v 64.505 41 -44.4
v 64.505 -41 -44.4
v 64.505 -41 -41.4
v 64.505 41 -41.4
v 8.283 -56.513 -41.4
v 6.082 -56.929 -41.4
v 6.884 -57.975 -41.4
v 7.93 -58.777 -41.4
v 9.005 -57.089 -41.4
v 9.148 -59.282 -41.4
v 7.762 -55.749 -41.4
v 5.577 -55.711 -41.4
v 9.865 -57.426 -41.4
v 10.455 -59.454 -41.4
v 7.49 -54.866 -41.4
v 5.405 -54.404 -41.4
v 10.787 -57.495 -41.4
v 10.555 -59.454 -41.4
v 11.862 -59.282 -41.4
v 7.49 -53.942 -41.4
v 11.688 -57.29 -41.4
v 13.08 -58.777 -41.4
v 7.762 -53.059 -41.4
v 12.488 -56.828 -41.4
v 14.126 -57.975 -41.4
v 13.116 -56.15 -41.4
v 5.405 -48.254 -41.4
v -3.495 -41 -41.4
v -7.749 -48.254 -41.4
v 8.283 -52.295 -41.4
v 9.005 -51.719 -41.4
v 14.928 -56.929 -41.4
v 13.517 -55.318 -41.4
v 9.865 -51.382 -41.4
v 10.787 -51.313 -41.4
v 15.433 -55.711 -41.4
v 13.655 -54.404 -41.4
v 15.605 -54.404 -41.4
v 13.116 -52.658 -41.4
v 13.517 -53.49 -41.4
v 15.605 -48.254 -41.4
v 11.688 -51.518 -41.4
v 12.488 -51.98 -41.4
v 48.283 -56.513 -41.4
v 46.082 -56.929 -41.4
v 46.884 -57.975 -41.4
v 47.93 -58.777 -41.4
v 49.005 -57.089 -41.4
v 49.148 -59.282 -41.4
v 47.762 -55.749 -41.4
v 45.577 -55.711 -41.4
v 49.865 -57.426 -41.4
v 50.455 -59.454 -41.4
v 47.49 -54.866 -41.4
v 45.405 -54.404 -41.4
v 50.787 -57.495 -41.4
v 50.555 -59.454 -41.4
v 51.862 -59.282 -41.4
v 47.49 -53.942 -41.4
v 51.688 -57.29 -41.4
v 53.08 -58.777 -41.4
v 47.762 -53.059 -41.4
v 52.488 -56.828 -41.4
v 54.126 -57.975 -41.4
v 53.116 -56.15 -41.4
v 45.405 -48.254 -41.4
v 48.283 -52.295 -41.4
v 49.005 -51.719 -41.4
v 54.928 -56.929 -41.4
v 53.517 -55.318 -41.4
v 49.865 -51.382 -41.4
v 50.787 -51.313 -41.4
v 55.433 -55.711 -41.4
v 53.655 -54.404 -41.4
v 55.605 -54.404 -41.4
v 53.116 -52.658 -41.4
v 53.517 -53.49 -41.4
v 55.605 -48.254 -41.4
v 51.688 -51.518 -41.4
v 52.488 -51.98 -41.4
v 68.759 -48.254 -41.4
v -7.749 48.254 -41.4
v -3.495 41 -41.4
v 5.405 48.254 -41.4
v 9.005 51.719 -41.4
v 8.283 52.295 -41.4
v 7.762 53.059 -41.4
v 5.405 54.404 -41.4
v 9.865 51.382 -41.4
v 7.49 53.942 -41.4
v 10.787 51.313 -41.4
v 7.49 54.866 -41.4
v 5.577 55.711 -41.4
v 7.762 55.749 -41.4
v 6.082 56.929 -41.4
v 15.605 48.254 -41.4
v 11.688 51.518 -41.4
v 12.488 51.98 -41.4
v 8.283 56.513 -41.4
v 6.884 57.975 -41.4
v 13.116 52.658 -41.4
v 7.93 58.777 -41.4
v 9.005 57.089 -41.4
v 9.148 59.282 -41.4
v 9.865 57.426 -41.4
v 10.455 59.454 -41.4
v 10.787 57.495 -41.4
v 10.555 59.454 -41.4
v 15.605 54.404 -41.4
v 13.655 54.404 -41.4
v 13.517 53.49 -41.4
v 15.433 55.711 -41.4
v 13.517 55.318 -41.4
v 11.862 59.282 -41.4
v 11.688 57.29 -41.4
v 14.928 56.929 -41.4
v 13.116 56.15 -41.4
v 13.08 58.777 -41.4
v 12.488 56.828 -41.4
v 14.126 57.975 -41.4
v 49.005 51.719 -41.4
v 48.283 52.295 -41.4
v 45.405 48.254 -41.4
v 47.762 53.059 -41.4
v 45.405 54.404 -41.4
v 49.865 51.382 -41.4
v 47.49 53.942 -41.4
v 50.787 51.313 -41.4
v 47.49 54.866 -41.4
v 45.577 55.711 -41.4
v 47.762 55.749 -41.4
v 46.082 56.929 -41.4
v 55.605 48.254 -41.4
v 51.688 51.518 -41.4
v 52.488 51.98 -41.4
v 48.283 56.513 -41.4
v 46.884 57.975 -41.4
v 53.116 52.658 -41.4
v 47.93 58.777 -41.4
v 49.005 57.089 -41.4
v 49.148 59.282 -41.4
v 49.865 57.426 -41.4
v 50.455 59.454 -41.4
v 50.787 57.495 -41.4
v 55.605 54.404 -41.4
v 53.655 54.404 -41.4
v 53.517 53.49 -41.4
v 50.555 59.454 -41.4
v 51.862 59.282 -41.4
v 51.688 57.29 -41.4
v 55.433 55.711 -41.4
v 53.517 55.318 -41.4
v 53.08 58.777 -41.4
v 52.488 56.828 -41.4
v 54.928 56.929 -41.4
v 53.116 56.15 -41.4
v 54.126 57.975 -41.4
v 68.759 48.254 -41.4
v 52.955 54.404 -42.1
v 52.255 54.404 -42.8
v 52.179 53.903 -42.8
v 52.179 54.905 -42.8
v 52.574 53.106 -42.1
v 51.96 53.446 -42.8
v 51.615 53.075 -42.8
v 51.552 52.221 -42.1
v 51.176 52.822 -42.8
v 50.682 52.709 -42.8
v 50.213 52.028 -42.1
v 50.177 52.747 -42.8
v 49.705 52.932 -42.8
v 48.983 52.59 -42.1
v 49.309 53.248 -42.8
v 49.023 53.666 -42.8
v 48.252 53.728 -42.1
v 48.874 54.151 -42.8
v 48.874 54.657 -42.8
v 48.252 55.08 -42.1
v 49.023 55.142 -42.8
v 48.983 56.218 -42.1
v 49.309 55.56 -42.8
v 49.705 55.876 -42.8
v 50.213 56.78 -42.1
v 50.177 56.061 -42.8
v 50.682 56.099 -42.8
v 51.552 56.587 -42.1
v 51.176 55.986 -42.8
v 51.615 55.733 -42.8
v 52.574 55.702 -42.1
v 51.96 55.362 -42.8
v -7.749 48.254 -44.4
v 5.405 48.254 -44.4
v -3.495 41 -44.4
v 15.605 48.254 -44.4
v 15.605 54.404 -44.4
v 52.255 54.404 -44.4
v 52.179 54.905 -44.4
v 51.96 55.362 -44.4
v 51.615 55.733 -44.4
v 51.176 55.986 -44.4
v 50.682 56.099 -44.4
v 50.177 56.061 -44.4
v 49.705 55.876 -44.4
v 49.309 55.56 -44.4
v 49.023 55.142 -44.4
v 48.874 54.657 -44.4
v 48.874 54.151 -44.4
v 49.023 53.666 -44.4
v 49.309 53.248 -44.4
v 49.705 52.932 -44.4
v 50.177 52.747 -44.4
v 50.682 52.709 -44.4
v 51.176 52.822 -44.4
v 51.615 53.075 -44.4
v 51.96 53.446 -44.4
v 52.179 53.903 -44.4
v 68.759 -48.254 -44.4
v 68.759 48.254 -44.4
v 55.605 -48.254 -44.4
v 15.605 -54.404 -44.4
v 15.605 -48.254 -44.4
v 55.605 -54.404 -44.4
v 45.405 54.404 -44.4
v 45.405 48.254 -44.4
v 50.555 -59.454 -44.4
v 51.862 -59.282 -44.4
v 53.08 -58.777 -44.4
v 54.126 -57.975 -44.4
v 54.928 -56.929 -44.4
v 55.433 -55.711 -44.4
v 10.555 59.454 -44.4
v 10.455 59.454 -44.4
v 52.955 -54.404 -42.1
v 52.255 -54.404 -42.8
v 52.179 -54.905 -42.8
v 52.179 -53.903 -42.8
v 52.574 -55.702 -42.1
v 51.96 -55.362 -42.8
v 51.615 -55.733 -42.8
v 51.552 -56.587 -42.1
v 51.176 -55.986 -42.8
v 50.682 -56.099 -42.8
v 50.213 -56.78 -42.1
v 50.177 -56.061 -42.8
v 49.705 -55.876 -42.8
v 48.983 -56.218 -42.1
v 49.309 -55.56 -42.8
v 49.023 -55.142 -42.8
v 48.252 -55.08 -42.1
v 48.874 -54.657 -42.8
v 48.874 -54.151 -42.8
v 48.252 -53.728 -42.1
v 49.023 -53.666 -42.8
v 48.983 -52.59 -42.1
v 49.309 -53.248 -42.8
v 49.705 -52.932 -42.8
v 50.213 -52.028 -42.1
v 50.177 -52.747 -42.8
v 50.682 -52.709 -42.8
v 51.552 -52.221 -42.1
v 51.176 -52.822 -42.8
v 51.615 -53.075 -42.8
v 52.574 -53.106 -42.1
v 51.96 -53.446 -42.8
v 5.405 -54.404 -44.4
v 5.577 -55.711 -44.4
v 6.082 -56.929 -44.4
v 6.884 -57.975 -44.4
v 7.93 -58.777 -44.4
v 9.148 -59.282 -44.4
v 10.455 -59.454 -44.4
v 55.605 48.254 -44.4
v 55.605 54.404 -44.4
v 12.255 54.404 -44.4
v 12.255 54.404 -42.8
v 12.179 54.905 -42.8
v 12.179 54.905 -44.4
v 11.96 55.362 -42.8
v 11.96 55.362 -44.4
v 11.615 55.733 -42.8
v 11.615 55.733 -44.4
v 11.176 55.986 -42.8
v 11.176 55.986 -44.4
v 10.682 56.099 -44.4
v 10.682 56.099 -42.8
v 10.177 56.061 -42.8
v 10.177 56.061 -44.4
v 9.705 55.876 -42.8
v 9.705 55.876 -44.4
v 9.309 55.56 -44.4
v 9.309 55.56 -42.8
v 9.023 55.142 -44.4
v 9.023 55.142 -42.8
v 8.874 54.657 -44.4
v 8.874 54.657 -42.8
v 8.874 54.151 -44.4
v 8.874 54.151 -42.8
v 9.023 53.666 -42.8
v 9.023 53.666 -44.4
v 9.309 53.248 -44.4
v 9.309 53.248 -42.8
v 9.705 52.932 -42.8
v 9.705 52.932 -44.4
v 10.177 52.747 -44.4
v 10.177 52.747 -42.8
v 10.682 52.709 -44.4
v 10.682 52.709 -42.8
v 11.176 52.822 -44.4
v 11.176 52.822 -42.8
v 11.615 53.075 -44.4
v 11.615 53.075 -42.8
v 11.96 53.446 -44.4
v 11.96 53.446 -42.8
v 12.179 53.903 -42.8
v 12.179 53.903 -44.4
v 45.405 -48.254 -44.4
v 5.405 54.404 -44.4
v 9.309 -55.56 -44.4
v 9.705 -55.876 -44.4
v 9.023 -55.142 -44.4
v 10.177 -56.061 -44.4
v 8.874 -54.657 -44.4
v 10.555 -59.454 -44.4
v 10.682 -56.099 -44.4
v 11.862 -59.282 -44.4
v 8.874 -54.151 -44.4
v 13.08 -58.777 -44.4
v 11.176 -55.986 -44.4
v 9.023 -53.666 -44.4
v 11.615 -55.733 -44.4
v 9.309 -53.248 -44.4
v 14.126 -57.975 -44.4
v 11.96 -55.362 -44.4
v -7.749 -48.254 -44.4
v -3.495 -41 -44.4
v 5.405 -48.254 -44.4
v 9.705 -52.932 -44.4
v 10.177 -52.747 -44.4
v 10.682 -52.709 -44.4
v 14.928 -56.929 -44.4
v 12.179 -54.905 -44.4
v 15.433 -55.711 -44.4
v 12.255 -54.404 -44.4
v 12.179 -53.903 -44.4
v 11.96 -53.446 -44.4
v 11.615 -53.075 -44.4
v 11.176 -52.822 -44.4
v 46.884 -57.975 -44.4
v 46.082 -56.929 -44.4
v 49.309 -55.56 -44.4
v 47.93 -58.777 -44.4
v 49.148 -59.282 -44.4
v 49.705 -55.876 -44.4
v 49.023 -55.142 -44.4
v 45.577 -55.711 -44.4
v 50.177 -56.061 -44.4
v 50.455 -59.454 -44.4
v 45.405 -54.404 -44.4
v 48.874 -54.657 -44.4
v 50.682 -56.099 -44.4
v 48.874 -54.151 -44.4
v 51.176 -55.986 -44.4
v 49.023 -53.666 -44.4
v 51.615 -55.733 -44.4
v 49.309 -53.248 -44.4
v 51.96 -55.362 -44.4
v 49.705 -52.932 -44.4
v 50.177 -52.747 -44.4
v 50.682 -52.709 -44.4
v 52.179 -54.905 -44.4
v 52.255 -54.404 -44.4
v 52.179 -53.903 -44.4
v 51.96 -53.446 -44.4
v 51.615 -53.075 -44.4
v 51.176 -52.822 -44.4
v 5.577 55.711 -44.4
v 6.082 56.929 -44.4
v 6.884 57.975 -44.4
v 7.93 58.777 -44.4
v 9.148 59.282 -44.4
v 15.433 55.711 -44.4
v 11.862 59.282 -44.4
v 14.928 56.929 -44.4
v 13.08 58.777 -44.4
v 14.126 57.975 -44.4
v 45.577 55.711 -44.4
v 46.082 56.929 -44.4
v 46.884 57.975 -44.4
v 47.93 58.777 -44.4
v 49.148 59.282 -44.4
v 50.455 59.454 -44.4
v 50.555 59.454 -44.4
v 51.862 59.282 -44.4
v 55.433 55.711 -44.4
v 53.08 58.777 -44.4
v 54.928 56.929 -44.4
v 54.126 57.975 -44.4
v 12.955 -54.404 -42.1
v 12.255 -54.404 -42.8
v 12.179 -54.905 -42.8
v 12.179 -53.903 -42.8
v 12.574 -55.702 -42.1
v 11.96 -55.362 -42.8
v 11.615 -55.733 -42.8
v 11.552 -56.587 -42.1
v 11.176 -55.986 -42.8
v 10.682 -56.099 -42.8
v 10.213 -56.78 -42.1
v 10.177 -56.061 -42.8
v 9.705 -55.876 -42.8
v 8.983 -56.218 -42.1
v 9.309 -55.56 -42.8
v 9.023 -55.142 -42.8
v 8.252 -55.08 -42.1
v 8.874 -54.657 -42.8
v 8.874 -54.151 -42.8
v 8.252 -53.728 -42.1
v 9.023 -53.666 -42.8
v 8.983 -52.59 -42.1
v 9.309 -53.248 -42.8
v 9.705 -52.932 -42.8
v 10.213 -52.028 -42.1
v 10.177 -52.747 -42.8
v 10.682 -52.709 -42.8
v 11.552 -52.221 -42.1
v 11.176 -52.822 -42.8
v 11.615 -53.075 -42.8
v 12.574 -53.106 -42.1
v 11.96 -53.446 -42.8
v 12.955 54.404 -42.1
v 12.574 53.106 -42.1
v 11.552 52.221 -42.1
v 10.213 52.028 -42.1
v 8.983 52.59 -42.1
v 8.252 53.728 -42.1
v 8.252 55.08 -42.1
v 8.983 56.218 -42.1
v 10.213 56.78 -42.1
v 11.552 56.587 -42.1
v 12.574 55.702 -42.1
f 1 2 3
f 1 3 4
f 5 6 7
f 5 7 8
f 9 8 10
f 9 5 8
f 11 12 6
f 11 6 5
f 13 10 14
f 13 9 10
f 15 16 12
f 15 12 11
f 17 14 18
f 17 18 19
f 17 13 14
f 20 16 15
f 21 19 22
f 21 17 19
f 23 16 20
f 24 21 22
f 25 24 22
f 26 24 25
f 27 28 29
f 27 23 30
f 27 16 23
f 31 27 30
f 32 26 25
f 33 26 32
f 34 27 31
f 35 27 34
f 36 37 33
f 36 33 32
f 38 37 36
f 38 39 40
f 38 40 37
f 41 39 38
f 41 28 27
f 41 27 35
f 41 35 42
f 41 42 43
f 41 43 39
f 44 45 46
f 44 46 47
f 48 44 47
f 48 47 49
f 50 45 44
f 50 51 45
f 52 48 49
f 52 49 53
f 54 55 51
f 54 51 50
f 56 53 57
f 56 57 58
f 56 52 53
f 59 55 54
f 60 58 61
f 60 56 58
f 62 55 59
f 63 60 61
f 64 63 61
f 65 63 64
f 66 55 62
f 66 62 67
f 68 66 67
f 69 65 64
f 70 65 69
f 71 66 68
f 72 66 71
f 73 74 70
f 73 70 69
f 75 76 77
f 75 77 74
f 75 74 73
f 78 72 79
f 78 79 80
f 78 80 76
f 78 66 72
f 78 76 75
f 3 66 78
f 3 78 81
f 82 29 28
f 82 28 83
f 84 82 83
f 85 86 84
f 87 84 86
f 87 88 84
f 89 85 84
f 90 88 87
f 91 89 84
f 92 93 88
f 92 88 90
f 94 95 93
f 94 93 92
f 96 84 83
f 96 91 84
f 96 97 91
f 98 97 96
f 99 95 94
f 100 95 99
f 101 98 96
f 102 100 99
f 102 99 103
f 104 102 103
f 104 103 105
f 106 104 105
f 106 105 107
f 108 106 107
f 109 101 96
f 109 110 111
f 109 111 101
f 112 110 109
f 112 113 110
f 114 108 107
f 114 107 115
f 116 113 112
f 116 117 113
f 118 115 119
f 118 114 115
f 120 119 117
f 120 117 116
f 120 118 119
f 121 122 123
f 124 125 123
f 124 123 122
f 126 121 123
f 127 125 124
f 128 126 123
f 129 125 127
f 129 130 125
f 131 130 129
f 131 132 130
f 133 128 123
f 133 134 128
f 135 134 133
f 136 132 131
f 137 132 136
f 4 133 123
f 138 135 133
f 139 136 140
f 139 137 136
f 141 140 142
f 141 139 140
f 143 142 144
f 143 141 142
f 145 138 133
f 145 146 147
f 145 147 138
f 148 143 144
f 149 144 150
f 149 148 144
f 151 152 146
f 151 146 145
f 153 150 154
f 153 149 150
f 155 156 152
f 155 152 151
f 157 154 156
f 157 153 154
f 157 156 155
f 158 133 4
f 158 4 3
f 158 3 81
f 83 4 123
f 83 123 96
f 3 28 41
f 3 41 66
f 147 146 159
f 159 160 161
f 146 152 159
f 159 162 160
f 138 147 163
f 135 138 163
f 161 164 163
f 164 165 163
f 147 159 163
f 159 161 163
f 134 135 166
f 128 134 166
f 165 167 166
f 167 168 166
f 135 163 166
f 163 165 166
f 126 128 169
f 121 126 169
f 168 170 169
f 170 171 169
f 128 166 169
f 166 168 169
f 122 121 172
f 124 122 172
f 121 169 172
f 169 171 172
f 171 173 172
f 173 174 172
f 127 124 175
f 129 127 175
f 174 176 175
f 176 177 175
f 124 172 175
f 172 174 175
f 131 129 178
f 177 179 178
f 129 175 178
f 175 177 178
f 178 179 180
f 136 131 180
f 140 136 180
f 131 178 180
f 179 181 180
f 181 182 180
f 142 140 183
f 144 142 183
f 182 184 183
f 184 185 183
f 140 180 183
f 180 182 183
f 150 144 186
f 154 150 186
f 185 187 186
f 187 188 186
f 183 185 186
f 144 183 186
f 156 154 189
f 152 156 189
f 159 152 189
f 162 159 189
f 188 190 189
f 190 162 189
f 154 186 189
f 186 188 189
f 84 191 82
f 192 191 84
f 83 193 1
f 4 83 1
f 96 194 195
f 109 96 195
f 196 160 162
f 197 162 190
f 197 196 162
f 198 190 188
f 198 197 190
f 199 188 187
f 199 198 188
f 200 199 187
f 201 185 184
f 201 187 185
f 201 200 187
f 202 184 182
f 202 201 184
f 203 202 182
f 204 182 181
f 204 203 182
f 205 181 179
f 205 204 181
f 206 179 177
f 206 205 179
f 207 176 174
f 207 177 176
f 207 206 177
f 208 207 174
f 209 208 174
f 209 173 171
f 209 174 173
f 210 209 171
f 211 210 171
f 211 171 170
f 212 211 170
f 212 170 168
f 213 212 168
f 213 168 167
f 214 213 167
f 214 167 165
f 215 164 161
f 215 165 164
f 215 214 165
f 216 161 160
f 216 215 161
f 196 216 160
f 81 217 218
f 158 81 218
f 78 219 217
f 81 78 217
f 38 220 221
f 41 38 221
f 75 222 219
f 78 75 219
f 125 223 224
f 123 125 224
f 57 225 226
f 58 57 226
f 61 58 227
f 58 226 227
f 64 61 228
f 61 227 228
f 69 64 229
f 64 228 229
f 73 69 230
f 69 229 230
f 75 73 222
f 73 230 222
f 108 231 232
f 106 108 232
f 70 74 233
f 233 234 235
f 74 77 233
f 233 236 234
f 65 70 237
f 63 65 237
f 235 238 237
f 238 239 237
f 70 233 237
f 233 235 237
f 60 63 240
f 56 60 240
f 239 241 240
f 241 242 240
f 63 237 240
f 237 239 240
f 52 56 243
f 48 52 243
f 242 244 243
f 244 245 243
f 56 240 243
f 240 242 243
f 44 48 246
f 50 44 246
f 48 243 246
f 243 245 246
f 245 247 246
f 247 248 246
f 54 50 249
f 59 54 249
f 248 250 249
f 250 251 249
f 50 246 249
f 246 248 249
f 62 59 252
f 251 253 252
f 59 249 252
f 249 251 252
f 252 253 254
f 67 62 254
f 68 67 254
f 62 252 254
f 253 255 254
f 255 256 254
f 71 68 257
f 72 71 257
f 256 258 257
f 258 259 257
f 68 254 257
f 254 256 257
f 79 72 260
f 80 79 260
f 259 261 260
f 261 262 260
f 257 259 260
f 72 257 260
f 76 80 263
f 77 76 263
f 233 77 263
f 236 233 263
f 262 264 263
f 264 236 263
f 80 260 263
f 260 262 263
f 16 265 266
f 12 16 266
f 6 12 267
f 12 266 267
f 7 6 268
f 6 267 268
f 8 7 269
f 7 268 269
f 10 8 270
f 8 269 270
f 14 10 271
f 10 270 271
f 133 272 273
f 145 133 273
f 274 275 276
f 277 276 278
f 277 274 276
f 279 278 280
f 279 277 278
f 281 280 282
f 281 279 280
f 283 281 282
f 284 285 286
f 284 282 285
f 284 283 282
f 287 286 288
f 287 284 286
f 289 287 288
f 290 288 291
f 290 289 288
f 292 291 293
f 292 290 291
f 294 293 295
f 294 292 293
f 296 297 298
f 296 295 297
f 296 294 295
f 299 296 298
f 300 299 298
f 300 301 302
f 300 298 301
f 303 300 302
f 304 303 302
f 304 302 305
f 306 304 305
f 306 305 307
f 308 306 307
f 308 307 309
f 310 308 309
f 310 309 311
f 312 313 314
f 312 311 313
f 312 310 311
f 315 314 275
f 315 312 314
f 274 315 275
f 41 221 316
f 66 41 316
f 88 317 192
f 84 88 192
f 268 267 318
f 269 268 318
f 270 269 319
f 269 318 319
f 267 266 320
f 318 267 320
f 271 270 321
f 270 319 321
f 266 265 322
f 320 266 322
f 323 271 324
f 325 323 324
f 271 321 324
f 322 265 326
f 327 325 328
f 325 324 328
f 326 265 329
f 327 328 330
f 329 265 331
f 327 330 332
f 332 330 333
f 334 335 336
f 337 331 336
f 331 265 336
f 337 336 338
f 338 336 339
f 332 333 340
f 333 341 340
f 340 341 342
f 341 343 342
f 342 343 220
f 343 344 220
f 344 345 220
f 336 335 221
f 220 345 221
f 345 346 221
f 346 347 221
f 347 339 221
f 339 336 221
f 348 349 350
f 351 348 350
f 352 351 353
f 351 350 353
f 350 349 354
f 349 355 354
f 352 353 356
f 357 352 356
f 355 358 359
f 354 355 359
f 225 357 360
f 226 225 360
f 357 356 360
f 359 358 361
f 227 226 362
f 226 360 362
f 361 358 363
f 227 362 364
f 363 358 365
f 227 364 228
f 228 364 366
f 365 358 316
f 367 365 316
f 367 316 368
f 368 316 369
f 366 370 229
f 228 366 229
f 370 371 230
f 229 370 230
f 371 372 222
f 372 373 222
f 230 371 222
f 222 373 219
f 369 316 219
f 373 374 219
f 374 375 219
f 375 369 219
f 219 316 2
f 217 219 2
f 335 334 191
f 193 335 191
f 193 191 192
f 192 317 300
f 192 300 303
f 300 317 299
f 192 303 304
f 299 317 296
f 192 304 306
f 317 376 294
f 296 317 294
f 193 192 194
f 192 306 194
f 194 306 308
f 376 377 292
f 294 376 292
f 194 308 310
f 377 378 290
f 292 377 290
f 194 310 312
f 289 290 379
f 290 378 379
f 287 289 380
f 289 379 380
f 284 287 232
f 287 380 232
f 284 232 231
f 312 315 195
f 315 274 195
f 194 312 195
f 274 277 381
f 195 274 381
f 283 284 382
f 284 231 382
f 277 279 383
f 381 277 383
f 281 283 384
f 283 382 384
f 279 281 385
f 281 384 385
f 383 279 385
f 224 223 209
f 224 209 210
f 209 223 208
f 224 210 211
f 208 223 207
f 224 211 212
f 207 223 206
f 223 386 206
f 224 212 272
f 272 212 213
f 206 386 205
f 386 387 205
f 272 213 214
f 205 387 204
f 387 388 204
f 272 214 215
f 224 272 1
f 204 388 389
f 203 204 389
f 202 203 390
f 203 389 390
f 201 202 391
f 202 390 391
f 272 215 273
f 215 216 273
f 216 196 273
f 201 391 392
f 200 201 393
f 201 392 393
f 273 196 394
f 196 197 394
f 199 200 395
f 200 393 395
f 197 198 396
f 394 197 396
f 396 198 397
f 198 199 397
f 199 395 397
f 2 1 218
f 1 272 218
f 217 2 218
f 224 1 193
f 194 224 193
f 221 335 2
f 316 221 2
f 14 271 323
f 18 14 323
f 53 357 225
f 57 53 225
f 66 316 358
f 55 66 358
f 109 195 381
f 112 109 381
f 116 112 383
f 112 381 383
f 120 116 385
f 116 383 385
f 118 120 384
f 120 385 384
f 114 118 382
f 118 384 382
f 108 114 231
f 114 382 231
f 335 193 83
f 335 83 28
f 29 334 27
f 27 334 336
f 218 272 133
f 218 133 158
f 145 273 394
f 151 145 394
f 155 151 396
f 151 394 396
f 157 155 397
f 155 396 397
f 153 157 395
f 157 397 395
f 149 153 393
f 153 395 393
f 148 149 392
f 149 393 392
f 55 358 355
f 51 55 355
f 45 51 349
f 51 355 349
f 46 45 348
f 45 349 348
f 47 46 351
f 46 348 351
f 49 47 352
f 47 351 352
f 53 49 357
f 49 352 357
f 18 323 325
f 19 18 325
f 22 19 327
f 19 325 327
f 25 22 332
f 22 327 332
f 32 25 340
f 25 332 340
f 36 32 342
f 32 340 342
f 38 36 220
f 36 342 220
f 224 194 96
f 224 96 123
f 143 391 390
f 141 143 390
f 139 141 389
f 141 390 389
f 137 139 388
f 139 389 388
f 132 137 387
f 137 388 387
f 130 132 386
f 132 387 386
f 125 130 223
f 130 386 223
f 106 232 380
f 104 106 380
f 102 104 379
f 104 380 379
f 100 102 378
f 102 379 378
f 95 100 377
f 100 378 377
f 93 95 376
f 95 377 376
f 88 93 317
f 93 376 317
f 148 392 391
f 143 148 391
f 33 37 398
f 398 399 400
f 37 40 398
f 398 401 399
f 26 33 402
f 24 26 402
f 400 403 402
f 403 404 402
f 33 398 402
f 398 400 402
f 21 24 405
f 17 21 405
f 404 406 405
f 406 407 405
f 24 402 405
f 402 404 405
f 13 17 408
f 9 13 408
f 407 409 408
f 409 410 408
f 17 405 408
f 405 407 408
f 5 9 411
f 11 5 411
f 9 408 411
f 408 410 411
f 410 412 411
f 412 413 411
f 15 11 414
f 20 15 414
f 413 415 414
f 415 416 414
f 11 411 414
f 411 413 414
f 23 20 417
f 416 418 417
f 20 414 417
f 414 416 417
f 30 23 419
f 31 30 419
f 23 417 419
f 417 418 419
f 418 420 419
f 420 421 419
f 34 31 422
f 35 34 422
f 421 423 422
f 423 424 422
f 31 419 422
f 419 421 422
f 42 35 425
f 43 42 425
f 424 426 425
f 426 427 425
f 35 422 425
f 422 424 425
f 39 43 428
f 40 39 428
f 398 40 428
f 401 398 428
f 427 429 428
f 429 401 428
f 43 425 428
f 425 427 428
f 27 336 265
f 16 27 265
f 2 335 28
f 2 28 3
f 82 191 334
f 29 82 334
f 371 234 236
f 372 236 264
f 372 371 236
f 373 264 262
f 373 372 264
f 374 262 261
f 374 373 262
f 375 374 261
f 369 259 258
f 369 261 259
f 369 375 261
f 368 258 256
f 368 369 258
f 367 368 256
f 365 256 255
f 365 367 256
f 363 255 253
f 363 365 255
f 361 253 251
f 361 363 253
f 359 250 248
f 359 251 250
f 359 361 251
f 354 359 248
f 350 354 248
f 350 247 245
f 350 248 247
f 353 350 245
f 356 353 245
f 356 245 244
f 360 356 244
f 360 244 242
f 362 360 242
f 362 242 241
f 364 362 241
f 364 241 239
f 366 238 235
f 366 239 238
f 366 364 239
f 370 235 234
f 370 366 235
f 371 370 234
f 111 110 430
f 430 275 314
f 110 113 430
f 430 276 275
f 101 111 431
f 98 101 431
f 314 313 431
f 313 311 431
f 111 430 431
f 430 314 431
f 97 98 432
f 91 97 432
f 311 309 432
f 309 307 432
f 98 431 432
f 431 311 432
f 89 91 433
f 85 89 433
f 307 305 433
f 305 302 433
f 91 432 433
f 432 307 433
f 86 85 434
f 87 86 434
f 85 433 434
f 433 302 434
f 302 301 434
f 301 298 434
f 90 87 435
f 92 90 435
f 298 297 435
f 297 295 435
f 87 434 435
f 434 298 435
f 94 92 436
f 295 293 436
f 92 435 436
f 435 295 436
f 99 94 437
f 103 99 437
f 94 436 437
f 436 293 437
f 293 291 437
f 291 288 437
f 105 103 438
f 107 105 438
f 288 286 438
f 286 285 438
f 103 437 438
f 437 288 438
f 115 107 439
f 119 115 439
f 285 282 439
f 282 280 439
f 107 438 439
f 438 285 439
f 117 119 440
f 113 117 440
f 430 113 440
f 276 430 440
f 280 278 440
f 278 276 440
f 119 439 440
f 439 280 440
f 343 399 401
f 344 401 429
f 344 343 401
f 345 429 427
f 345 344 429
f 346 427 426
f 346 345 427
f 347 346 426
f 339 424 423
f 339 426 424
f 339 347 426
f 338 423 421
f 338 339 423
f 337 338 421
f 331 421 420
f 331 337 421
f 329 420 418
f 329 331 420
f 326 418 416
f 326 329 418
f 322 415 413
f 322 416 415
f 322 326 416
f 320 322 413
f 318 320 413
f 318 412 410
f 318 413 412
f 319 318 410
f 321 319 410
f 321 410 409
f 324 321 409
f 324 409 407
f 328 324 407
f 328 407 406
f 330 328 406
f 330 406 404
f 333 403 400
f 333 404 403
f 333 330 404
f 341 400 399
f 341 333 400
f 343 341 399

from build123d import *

# Parameters (mm, degrees)
SKETCH045_R      = 1.7
EXTRUDE003_DEPTH = 4
EXTRUDE004_DEPTH = 3
CHAMFER001_SIZE  = 1.4


with BuildPart() as extrude003:
    # Sketch045 → Extrude003 (new body)
    with BuildSketch(Plane.XY):
        with Locations((10.555, 54.404)):
            Circle(SKETCH045_R)
        with Locations((50.555, 54.404)):
            Circle(SKETCH045_R)
        with Locations((10.555, -54.404)):
            Circle(SKETCH045_R)
        with Locations((50.555, -54.404)):
            Circle(SKETCH045_R)
    extrude(amount=EXTRUDE003_DEPTH)


with BuildPart() as pcbholder:
    # Sketch044 → Extrude004 (new body)
    with BuildSketch(Plane.XY):
        with BuildLine():
            Line((68.759, -48.254), (68.759, 48.254))
            Line((55.605, 48.254), (68.759, 48.254))
            Line((55.605, 48.254), (55.605, 54.404))
            ThreePointArc((55.605, 54.404), (54.125889, 57.974889), (50.555, 59.454))
            Line((50.555, 59.454), (50.455, 59.454))
            ThreePointArc((50.455, 59.454), (46.884111, 57.974889), (45.405, 54.404))
            Line((45.405, 54.404), (45.405, 48.254))
            Line((15.605, 48.254), (45.405, 48.254))
            Line((15.605, 48.254), (15.605, 54.404))
            ThreePointArc((15.605, 54.404), (14.125889, 57.974889), (10.555, 59.454))
            Line((10.555, 59.454), (10.455, 59.454))
            ThreePointArc((10.455, 59.454), (6.884111, 57.974889), (5.405, 54.404))
            Line((5.405, 54.404), (5.405, 48.254))
            Line((-7.749, 48.254), (5.405, 48.254))
            Line((-7.749, 48.254), (-7.749, 0))
            Line((-7.749, 0), (-7.749, -48.254))
            Line((-7.749, -48.254), (5.405, -48.254))
            Line((5.405, -48.254), (5.405, -54.404))
            ThreePointArc((5.405, -54.404), (6.884111, -57.974889), (10.455, -59.454))
            Line((10.455, -59.454), (10.555, -59.454))
            ThreePointArc((10.555, -59.454), (14.125889, -57.974889), (15.605, -54.404))
            Line((15.605, -54.404), (15.605, -48.254))
            Line((15.605, -48.254), (45.405, -48.254))
            Line((45.405, -48.254), (45.405, -54.404))
            ThreePointArc((45.405, -54.404), (46.884111, -57.974889), (50.455, -59.454))
            Line((50.455, -59.454), (50.555, -59.454))
            ThreePointArc((50.555, -59.454), (54.125889, -57.974889), (55.605, -54.404))
            Line((55.605, -54.404), (55.605, -48.254))
            Line((55.605, -48.254), (68.759, -48.254))
        make_face()
        Polygon((-3.495, 41), (-3.495, -41), (64.505, -41), (64.505, 41), (30.505, 41), align=None, mode=Mode.SUBTRACT)
    extrude(amount=EXTRUDE004_DEPTH)

    # Cut: cut Extrude003
    add(extrude003.part, mode=Mode.SUBTRACT)

    # Chamfer001
    chamfer001_edges = [pcbholder.edges().sort_by_distance(p)[0] for p in [
        (8.855, 54.404, 3),
        (48.855, 54.404, 3),
        (8.855, -54.404, 3),
        (48.855, -54.404, 3),
    ]]
    chamfer(chamfer001_edges, length=CHAMFER001_SIZE)


with BuildPart() as pcbholder_1:
    # Body004 placement: moved
    add(pcbholder.part.moved(Location((0, 0, -44.4))))


solid = pcbholder_1.part
